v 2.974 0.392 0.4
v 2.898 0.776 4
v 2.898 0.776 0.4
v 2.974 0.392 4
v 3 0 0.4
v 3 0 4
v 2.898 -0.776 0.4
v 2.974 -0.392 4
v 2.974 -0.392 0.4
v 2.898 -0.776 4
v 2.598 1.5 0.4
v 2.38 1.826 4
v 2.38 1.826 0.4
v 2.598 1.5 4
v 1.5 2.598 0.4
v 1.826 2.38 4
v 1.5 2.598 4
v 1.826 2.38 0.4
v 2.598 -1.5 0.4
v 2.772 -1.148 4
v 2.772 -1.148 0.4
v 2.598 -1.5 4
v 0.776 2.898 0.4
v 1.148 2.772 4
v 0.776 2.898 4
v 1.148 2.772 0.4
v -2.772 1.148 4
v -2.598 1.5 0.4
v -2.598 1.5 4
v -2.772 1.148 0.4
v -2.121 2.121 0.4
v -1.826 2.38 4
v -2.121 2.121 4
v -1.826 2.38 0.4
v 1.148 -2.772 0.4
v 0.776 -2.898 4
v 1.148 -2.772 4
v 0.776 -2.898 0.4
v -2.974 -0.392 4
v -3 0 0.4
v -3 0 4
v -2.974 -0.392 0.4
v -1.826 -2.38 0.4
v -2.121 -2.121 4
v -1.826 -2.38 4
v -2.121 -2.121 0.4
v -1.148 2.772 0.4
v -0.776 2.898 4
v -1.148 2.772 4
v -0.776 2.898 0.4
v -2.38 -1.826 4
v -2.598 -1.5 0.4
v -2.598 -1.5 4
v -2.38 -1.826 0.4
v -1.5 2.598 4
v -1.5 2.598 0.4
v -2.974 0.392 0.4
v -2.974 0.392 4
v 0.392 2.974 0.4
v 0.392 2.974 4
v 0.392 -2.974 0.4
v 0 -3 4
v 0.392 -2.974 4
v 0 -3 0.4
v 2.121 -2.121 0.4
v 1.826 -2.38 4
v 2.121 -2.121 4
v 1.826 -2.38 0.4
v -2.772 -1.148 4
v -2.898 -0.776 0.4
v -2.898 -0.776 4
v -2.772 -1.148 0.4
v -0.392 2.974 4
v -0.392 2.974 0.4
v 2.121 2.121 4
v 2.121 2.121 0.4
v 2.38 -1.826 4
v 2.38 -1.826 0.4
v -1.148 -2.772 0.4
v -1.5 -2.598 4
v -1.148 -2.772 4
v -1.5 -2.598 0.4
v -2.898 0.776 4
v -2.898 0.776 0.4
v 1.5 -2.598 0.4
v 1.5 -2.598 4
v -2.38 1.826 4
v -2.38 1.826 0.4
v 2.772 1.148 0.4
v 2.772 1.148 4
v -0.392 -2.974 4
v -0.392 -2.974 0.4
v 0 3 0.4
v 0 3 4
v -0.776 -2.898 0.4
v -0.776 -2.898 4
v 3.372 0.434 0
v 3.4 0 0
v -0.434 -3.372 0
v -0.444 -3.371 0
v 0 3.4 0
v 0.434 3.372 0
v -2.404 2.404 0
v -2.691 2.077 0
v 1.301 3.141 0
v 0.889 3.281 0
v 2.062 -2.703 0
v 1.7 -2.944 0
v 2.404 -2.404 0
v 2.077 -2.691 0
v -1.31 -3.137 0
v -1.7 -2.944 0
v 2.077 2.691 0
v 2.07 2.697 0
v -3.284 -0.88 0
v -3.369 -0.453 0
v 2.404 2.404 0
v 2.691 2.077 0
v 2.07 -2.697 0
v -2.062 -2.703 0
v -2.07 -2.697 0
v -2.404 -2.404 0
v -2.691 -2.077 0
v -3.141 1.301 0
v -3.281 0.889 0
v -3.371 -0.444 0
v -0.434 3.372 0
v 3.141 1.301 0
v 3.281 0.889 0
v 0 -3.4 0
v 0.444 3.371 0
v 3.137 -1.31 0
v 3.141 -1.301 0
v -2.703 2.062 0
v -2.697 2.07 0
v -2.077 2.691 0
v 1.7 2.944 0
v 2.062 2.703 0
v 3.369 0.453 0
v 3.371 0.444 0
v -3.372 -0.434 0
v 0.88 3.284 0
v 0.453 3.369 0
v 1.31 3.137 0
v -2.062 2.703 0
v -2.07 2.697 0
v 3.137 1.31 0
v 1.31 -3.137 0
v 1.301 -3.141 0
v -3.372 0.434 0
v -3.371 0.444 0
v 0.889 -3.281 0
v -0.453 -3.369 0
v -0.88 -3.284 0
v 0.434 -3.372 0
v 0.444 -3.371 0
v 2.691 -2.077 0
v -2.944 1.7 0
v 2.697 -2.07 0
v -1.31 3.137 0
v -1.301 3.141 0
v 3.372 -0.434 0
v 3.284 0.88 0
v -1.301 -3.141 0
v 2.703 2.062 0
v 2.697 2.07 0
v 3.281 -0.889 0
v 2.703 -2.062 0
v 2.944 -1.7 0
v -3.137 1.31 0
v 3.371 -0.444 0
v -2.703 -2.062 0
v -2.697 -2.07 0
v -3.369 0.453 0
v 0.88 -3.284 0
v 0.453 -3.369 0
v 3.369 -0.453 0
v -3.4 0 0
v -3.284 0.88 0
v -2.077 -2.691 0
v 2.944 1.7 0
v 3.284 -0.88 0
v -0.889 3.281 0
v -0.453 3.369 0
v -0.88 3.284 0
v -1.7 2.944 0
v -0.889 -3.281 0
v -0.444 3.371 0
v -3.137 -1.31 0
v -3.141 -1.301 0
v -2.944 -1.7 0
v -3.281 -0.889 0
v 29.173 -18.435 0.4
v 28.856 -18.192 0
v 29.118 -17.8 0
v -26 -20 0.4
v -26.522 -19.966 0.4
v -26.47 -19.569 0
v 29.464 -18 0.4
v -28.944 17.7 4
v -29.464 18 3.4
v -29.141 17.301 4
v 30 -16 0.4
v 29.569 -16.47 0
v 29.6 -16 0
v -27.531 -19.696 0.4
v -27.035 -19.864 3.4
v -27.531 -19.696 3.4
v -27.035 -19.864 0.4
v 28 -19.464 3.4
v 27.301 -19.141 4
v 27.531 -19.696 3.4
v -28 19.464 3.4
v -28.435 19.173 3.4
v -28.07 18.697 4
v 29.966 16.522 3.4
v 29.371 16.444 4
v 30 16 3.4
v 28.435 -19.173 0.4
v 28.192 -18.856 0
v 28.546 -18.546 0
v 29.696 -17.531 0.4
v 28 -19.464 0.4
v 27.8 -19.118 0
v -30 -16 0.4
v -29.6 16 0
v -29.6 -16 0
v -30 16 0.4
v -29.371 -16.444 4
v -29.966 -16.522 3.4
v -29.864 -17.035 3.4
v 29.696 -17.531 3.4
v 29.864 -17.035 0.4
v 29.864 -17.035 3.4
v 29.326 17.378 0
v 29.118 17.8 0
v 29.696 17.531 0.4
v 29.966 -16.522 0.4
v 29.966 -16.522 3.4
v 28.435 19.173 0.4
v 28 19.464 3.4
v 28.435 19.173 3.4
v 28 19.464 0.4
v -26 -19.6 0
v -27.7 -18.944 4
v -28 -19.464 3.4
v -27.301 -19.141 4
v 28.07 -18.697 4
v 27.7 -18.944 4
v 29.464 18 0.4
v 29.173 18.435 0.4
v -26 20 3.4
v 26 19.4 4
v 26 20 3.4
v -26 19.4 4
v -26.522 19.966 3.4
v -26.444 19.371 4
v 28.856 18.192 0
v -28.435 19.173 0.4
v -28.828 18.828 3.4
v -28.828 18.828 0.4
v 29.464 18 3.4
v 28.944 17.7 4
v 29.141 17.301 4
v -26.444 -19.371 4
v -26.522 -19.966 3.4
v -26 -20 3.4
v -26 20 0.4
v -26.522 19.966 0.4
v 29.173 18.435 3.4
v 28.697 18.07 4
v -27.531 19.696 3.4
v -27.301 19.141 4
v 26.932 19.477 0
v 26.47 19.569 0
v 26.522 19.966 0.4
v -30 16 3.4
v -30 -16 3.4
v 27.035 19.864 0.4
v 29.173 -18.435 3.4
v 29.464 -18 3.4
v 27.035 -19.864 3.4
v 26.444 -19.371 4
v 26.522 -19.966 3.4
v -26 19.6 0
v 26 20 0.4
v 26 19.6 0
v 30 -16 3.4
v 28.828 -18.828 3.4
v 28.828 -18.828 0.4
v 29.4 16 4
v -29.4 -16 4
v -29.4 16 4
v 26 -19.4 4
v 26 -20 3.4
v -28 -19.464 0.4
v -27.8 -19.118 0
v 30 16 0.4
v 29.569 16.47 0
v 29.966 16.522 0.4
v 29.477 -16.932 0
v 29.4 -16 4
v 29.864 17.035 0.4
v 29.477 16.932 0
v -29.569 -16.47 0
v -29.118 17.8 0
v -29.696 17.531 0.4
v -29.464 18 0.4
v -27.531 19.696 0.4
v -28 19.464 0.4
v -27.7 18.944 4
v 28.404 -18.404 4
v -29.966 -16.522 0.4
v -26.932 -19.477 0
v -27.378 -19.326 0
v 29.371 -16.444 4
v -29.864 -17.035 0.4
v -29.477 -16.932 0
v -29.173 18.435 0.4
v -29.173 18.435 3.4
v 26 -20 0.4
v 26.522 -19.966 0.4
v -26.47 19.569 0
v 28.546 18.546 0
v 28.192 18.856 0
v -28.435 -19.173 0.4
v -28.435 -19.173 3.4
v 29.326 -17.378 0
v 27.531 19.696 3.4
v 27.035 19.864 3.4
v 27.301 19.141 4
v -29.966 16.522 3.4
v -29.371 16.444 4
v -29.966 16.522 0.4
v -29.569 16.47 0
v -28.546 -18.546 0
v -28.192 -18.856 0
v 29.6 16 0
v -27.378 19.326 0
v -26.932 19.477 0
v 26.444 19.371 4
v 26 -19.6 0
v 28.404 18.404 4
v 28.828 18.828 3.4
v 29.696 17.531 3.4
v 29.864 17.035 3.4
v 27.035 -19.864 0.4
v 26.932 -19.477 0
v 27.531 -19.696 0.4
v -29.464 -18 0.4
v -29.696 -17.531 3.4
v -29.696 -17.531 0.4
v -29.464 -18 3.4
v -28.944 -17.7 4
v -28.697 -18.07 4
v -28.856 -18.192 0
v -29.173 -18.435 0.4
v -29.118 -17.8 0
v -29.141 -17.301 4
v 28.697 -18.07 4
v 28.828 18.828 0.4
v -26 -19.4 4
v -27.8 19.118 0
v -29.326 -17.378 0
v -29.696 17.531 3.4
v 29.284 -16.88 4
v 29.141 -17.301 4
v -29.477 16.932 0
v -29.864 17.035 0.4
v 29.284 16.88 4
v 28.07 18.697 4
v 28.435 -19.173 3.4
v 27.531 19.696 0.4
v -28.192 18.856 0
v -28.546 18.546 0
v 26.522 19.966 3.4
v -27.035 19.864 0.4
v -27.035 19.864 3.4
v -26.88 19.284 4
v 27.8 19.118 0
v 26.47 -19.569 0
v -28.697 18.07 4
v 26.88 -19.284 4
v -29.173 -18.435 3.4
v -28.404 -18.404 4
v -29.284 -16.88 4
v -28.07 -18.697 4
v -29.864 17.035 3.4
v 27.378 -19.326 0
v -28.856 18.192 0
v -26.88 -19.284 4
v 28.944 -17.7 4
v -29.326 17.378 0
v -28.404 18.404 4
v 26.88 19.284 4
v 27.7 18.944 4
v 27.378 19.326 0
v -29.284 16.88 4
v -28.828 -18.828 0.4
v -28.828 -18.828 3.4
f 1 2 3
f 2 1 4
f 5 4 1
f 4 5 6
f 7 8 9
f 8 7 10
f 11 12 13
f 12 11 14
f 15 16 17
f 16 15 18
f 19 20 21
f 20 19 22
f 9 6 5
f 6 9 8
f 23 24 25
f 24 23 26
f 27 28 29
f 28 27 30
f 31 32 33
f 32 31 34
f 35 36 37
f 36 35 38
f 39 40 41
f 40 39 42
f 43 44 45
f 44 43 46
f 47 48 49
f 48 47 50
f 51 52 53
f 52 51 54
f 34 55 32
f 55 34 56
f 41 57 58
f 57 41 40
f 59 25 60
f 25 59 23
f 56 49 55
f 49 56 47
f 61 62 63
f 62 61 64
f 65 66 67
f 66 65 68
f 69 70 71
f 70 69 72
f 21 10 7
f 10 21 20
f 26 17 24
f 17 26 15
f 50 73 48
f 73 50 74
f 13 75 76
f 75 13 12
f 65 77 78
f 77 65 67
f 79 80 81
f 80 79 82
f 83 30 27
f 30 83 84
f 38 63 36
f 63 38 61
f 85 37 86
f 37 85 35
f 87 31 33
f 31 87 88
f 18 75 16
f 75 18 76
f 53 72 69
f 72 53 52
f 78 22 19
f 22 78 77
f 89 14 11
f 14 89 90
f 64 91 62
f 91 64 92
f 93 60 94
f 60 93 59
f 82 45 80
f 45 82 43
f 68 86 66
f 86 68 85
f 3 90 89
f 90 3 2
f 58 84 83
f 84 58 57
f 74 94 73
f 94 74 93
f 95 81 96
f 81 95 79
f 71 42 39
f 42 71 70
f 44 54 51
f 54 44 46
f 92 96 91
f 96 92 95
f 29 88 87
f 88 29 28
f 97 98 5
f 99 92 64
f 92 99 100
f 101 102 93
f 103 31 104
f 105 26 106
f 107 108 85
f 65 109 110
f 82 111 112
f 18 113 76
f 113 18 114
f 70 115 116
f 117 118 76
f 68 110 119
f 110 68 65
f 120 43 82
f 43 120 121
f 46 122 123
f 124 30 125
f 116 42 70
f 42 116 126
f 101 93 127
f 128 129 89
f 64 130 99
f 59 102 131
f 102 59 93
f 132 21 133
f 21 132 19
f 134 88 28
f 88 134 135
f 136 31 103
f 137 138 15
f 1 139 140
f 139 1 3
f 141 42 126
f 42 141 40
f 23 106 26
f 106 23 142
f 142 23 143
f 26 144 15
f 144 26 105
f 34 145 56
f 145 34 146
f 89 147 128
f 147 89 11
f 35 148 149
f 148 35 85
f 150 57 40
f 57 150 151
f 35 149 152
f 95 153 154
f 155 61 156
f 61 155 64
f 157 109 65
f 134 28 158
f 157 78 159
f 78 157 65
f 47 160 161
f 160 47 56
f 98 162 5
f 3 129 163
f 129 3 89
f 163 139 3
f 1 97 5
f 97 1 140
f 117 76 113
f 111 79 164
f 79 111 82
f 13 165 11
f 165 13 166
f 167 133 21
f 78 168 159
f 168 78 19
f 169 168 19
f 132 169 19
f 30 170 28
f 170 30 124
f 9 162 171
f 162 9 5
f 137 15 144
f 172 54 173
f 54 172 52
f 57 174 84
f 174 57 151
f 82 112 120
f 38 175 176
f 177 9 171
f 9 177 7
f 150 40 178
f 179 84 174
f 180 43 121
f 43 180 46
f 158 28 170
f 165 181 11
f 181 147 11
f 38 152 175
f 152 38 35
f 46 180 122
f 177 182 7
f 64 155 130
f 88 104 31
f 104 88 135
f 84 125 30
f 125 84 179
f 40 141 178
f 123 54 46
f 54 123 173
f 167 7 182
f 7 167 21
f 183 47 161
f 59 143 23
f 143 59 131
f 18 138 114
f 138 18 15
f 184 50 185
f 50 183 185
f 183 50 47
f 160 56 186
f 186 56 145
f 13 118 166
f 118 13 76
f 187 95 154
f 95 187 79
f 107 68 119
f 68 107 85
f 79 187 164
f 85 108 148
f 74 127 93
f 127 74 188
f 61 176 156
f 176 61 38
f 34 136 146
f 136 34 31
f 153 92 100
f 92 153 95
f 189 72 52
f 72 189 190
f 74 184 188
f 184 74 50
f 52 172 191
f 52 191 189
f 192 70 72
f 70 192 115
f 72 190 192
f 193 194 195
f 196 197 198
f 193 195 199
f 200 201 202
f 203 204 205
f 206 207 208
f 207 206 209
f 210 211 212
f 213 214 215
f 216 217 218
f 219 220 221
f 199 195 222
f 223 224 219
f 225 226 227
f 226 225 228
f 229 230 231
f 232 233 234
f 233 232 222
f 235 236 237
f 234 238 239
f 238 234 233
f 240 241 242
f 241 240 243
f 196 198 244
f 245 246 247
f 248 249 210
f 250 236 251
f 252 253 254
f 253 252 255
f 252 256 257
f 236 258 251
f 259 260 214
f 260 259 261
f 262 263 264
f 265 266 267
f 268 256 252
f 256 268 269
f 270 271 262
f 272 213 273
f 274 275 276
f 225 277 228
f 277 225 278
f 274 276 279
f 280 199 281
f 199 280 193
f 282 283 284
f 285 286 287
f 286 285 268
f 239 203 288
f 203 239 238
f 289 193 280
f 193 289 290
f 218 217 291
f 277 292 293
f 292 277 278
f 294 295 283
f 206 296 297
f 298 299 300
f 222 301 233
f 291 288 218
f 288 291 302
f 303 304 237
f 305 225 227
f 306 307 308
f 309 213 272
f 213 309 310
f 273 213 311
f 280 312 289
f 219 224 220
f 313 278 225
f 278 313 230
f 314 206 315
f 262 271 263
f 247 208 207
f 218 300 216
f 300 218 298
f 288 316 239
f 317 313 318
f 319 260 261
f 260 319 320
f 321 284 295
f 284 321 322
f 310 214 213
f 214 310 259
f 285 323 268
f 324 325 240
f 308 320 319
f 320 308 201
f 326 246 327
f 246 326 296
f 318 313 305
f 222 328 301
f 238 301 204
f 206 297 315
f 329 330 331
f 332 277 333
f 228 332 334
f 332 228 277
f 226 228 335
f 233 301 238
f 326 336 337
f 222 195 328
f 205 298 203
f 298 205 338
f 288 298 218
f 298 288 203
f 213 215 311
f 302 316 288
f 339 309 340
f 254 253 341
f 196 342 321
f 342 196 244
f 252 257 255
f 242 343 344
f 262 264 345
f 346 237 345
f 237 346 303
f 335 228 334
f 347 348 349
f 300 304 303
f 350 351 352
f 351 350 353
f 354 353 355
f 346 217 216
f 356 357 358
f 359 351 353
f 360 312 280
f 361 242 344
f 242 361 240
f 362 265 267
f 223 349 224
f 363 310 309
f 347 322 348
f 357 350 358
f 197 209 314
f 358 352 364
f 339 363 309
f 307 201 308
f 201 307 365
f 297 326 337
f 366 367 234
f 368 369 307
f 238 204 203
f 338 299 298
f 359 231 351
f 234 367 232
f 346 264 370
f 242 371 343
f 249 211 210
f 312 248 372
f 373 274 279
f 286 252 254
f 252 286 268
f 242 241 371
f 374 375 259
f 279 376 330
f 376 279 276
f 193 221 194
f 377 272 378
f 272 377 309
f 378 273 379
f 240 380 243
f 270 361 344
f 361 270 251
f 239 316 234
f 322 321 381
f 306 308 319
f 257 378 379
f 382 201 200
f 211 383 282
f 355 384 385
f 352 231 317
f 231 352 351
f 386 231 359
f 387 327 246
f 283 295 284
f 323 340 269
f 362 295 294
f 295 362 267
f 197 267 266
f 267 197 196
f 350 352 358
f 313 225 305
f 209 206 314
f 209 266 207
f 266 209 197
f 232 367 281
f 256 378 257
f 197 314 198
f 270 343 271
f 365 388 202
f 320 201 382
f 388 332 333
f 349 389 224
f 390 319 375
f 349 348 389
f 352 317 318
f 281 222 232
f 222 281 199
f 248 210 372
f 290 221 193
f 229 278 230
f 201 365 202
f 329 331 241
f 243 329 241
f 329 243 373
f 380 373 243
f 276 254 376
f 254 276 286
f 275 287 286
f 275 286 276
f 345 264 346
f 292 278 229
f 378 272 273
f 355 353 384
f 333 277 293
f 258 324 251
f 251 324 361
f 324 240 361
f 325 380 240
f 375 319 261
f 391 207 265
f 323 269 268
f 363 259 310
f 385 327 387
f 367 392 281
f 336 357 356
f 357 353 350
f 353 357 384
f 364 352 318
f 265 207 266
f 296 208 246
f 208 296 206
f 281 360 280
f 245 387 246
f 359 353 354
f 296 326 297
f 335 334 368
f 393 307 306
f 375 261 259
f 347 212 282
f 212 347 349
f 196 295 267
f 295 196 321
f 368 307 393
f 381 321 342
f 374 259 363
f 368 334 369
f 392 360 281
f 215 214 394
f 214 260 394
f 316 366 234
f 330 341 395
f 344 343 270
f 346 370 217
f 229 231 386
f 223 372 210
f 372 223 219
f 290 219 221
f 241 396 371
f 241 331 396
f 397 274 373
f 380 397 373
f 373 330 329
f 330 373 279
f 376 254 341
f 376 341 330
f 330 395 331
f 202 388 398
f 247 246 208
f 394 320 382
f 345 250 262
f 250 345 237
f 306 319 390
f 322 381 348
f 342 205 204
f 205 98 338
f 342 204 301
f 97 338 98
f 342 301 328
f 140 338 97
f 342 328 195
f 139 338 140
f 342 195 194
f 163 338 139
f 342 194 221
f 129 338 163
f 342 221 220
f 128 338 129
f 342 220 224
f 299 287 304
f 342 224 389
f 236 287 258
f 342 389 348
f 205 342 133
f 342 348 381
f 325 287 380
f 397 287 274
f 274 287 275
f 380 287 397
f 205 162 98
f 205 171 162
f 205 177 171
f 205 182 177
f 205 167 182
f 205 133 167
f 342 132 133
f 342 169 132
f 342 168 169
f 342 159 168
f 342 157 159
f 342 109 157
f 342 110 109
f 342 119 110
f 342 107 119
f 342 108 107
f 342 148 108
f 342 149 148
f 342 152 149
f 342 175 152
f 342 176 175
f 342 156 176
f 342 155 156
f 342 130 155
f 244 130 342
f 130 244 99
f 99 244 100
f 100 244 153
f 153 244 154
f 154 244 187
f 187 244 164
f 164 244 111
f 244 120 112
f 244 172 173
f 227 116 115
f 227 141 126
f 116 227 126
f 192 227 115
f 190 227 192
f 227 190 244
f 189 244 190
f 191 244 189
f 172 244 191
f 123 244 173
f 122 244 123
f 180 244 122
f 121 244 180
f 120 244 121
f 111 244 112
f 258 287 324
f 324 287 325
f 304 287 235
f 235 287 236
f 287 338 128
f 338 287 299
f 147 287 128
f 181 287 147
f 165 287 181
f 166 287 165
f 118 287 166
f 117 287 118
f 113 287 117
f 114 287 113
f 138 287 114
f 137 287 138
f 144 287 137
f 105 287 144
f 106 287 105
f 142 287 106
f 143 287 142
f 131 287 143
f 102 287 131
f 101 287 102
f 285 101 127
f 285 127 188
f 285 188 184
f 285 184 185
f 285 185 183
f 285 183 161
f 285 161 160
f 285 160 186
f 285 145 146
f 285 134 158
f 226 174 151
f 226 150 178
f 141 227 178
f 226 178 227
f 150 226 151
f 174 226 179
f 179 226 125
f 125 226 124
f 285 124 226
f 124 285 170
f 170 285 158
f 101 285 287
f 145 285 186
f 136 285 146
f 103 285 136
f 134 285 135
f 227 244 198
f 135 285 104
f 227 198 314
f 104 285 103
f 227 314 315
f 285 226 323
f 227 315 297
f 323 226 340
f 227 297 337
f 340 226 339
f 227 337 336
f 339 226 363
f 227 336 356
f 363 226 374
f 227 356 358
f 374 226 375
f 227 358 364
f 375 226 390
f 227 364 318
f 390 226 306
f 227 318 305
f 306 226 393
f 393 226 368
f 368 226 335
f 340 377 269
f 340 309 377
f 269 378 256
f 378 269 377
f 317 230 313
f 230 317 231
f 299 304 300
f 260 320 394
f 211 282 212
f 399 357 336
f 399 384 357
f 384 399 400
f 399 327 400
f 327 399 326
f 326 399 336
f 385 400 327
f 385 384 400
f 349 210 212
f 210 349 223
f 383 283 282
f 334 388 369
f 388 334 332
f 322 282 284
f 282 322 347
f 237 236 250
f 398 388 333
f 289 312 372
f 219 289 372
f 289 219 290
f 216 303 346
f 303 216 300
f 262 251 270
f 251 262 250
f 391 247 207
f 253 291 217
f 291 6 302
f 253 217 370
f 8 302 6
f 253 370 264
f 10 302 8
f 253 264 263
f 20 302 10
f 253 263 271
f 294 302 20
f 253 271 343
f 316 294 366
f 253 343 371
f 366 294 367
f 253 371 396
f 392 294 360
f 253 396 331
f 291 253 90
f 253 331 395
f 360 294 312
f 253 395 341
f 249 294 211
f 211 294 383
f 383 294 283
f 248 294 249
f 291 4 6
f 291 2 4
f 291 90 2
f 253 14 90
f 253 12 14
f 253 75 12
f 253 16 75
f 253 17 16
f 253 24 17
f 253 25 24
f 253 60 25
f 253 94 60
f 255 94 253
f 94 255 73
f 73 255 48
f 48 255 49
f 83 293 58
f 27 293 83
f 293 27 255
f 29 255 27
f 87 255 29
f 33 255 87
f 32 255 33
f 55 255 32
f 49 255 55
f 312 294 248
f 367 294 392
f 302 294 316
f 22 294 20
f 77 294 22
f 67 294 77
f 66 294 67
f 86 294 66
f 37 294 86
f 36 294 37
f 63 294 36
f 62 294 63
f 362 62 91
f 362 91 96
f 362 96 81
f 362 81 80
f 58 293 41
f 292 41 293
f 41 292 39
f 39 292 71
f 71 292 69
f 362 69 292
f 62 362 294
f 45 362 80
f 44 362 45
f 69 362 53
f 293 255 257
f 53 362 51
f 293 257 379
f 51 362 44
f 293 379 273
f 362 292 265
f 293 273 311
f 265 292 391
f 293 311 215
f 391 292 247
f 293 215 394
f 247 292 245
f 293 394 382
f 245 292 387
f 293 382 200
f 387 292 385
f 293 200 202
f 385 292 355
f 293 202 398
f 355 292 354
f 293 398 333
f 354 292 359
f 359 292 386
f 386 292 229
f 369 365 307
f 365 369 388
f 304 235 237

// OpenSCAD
// _demo: rounded plate with one through hole. Test recipe for stone, plain OpenSCAD.
w = 60;          // plate width along X, mm
d = 40;          // plate depth along Y, mm
h = 4;           // plate thickness, mm
corner_r = 4;    // corner radius, mm
hole_d = 6;      // hole diameter, mm (0 = no hole)
hole_place = "center"; // center | left
chamfer = true;  // 0.6 mm chamfer on the top edge (the bed edge always gets 0.4 mm)
quality = 48;    // circle segments

$fn = quality;
c = chamfer ? min(0.6, h / 3) : 0;

assert(corner_r * 2 < min(w, d), "corner_r must be less than half of w and d");
assert(hole_d < min(w, d) - 4, "hole_d must leave 2 mm of plate around the hole");

module rounded_rect(x, y, r) {
    rr = max(r, 0.01);
    hull() for (sx = [-1, 1], sy = [-1, 1])
        translate([sx * (x / 2 - rr), sy * (y / 2 - rr)]) circle(r = rr);
}

b = 0.4;         // bed-edge chamfer, so the first layer does not flare out

module body() {
    hull() {
        linear_extrude(0.01) rounded_rect(w - 2 * b, d - 2 * b, max(corner_r - b, 0.01));
        translate([0, 0, b]) linear_extrude(h - c - b) rounded_rect(w, d, corner_r);
        if (c > 0)
            translate([0, 0, h - c]) linear_extrude(c) rounded_rect(w - 2 * c, d - 2 * c, max(corner_r - c, 0.01));
    }
}

hole_x = hole_place == "left" ? -w / 2 + hole_d / 2 + max(corner_r, 4) : 0;

difference() {
    body();
    if (hole_d > 0) translate([hole_x, 0, 0]) {
        translate([0, 0, -1]) cylinder(d = hole_d, h = h + 2);
        translate([0, 0, -0.01]) cylinder(d1 = hole_d + 2 * b + 0.02, d2 = hole_d, h = b + 0.01);
    }
}
